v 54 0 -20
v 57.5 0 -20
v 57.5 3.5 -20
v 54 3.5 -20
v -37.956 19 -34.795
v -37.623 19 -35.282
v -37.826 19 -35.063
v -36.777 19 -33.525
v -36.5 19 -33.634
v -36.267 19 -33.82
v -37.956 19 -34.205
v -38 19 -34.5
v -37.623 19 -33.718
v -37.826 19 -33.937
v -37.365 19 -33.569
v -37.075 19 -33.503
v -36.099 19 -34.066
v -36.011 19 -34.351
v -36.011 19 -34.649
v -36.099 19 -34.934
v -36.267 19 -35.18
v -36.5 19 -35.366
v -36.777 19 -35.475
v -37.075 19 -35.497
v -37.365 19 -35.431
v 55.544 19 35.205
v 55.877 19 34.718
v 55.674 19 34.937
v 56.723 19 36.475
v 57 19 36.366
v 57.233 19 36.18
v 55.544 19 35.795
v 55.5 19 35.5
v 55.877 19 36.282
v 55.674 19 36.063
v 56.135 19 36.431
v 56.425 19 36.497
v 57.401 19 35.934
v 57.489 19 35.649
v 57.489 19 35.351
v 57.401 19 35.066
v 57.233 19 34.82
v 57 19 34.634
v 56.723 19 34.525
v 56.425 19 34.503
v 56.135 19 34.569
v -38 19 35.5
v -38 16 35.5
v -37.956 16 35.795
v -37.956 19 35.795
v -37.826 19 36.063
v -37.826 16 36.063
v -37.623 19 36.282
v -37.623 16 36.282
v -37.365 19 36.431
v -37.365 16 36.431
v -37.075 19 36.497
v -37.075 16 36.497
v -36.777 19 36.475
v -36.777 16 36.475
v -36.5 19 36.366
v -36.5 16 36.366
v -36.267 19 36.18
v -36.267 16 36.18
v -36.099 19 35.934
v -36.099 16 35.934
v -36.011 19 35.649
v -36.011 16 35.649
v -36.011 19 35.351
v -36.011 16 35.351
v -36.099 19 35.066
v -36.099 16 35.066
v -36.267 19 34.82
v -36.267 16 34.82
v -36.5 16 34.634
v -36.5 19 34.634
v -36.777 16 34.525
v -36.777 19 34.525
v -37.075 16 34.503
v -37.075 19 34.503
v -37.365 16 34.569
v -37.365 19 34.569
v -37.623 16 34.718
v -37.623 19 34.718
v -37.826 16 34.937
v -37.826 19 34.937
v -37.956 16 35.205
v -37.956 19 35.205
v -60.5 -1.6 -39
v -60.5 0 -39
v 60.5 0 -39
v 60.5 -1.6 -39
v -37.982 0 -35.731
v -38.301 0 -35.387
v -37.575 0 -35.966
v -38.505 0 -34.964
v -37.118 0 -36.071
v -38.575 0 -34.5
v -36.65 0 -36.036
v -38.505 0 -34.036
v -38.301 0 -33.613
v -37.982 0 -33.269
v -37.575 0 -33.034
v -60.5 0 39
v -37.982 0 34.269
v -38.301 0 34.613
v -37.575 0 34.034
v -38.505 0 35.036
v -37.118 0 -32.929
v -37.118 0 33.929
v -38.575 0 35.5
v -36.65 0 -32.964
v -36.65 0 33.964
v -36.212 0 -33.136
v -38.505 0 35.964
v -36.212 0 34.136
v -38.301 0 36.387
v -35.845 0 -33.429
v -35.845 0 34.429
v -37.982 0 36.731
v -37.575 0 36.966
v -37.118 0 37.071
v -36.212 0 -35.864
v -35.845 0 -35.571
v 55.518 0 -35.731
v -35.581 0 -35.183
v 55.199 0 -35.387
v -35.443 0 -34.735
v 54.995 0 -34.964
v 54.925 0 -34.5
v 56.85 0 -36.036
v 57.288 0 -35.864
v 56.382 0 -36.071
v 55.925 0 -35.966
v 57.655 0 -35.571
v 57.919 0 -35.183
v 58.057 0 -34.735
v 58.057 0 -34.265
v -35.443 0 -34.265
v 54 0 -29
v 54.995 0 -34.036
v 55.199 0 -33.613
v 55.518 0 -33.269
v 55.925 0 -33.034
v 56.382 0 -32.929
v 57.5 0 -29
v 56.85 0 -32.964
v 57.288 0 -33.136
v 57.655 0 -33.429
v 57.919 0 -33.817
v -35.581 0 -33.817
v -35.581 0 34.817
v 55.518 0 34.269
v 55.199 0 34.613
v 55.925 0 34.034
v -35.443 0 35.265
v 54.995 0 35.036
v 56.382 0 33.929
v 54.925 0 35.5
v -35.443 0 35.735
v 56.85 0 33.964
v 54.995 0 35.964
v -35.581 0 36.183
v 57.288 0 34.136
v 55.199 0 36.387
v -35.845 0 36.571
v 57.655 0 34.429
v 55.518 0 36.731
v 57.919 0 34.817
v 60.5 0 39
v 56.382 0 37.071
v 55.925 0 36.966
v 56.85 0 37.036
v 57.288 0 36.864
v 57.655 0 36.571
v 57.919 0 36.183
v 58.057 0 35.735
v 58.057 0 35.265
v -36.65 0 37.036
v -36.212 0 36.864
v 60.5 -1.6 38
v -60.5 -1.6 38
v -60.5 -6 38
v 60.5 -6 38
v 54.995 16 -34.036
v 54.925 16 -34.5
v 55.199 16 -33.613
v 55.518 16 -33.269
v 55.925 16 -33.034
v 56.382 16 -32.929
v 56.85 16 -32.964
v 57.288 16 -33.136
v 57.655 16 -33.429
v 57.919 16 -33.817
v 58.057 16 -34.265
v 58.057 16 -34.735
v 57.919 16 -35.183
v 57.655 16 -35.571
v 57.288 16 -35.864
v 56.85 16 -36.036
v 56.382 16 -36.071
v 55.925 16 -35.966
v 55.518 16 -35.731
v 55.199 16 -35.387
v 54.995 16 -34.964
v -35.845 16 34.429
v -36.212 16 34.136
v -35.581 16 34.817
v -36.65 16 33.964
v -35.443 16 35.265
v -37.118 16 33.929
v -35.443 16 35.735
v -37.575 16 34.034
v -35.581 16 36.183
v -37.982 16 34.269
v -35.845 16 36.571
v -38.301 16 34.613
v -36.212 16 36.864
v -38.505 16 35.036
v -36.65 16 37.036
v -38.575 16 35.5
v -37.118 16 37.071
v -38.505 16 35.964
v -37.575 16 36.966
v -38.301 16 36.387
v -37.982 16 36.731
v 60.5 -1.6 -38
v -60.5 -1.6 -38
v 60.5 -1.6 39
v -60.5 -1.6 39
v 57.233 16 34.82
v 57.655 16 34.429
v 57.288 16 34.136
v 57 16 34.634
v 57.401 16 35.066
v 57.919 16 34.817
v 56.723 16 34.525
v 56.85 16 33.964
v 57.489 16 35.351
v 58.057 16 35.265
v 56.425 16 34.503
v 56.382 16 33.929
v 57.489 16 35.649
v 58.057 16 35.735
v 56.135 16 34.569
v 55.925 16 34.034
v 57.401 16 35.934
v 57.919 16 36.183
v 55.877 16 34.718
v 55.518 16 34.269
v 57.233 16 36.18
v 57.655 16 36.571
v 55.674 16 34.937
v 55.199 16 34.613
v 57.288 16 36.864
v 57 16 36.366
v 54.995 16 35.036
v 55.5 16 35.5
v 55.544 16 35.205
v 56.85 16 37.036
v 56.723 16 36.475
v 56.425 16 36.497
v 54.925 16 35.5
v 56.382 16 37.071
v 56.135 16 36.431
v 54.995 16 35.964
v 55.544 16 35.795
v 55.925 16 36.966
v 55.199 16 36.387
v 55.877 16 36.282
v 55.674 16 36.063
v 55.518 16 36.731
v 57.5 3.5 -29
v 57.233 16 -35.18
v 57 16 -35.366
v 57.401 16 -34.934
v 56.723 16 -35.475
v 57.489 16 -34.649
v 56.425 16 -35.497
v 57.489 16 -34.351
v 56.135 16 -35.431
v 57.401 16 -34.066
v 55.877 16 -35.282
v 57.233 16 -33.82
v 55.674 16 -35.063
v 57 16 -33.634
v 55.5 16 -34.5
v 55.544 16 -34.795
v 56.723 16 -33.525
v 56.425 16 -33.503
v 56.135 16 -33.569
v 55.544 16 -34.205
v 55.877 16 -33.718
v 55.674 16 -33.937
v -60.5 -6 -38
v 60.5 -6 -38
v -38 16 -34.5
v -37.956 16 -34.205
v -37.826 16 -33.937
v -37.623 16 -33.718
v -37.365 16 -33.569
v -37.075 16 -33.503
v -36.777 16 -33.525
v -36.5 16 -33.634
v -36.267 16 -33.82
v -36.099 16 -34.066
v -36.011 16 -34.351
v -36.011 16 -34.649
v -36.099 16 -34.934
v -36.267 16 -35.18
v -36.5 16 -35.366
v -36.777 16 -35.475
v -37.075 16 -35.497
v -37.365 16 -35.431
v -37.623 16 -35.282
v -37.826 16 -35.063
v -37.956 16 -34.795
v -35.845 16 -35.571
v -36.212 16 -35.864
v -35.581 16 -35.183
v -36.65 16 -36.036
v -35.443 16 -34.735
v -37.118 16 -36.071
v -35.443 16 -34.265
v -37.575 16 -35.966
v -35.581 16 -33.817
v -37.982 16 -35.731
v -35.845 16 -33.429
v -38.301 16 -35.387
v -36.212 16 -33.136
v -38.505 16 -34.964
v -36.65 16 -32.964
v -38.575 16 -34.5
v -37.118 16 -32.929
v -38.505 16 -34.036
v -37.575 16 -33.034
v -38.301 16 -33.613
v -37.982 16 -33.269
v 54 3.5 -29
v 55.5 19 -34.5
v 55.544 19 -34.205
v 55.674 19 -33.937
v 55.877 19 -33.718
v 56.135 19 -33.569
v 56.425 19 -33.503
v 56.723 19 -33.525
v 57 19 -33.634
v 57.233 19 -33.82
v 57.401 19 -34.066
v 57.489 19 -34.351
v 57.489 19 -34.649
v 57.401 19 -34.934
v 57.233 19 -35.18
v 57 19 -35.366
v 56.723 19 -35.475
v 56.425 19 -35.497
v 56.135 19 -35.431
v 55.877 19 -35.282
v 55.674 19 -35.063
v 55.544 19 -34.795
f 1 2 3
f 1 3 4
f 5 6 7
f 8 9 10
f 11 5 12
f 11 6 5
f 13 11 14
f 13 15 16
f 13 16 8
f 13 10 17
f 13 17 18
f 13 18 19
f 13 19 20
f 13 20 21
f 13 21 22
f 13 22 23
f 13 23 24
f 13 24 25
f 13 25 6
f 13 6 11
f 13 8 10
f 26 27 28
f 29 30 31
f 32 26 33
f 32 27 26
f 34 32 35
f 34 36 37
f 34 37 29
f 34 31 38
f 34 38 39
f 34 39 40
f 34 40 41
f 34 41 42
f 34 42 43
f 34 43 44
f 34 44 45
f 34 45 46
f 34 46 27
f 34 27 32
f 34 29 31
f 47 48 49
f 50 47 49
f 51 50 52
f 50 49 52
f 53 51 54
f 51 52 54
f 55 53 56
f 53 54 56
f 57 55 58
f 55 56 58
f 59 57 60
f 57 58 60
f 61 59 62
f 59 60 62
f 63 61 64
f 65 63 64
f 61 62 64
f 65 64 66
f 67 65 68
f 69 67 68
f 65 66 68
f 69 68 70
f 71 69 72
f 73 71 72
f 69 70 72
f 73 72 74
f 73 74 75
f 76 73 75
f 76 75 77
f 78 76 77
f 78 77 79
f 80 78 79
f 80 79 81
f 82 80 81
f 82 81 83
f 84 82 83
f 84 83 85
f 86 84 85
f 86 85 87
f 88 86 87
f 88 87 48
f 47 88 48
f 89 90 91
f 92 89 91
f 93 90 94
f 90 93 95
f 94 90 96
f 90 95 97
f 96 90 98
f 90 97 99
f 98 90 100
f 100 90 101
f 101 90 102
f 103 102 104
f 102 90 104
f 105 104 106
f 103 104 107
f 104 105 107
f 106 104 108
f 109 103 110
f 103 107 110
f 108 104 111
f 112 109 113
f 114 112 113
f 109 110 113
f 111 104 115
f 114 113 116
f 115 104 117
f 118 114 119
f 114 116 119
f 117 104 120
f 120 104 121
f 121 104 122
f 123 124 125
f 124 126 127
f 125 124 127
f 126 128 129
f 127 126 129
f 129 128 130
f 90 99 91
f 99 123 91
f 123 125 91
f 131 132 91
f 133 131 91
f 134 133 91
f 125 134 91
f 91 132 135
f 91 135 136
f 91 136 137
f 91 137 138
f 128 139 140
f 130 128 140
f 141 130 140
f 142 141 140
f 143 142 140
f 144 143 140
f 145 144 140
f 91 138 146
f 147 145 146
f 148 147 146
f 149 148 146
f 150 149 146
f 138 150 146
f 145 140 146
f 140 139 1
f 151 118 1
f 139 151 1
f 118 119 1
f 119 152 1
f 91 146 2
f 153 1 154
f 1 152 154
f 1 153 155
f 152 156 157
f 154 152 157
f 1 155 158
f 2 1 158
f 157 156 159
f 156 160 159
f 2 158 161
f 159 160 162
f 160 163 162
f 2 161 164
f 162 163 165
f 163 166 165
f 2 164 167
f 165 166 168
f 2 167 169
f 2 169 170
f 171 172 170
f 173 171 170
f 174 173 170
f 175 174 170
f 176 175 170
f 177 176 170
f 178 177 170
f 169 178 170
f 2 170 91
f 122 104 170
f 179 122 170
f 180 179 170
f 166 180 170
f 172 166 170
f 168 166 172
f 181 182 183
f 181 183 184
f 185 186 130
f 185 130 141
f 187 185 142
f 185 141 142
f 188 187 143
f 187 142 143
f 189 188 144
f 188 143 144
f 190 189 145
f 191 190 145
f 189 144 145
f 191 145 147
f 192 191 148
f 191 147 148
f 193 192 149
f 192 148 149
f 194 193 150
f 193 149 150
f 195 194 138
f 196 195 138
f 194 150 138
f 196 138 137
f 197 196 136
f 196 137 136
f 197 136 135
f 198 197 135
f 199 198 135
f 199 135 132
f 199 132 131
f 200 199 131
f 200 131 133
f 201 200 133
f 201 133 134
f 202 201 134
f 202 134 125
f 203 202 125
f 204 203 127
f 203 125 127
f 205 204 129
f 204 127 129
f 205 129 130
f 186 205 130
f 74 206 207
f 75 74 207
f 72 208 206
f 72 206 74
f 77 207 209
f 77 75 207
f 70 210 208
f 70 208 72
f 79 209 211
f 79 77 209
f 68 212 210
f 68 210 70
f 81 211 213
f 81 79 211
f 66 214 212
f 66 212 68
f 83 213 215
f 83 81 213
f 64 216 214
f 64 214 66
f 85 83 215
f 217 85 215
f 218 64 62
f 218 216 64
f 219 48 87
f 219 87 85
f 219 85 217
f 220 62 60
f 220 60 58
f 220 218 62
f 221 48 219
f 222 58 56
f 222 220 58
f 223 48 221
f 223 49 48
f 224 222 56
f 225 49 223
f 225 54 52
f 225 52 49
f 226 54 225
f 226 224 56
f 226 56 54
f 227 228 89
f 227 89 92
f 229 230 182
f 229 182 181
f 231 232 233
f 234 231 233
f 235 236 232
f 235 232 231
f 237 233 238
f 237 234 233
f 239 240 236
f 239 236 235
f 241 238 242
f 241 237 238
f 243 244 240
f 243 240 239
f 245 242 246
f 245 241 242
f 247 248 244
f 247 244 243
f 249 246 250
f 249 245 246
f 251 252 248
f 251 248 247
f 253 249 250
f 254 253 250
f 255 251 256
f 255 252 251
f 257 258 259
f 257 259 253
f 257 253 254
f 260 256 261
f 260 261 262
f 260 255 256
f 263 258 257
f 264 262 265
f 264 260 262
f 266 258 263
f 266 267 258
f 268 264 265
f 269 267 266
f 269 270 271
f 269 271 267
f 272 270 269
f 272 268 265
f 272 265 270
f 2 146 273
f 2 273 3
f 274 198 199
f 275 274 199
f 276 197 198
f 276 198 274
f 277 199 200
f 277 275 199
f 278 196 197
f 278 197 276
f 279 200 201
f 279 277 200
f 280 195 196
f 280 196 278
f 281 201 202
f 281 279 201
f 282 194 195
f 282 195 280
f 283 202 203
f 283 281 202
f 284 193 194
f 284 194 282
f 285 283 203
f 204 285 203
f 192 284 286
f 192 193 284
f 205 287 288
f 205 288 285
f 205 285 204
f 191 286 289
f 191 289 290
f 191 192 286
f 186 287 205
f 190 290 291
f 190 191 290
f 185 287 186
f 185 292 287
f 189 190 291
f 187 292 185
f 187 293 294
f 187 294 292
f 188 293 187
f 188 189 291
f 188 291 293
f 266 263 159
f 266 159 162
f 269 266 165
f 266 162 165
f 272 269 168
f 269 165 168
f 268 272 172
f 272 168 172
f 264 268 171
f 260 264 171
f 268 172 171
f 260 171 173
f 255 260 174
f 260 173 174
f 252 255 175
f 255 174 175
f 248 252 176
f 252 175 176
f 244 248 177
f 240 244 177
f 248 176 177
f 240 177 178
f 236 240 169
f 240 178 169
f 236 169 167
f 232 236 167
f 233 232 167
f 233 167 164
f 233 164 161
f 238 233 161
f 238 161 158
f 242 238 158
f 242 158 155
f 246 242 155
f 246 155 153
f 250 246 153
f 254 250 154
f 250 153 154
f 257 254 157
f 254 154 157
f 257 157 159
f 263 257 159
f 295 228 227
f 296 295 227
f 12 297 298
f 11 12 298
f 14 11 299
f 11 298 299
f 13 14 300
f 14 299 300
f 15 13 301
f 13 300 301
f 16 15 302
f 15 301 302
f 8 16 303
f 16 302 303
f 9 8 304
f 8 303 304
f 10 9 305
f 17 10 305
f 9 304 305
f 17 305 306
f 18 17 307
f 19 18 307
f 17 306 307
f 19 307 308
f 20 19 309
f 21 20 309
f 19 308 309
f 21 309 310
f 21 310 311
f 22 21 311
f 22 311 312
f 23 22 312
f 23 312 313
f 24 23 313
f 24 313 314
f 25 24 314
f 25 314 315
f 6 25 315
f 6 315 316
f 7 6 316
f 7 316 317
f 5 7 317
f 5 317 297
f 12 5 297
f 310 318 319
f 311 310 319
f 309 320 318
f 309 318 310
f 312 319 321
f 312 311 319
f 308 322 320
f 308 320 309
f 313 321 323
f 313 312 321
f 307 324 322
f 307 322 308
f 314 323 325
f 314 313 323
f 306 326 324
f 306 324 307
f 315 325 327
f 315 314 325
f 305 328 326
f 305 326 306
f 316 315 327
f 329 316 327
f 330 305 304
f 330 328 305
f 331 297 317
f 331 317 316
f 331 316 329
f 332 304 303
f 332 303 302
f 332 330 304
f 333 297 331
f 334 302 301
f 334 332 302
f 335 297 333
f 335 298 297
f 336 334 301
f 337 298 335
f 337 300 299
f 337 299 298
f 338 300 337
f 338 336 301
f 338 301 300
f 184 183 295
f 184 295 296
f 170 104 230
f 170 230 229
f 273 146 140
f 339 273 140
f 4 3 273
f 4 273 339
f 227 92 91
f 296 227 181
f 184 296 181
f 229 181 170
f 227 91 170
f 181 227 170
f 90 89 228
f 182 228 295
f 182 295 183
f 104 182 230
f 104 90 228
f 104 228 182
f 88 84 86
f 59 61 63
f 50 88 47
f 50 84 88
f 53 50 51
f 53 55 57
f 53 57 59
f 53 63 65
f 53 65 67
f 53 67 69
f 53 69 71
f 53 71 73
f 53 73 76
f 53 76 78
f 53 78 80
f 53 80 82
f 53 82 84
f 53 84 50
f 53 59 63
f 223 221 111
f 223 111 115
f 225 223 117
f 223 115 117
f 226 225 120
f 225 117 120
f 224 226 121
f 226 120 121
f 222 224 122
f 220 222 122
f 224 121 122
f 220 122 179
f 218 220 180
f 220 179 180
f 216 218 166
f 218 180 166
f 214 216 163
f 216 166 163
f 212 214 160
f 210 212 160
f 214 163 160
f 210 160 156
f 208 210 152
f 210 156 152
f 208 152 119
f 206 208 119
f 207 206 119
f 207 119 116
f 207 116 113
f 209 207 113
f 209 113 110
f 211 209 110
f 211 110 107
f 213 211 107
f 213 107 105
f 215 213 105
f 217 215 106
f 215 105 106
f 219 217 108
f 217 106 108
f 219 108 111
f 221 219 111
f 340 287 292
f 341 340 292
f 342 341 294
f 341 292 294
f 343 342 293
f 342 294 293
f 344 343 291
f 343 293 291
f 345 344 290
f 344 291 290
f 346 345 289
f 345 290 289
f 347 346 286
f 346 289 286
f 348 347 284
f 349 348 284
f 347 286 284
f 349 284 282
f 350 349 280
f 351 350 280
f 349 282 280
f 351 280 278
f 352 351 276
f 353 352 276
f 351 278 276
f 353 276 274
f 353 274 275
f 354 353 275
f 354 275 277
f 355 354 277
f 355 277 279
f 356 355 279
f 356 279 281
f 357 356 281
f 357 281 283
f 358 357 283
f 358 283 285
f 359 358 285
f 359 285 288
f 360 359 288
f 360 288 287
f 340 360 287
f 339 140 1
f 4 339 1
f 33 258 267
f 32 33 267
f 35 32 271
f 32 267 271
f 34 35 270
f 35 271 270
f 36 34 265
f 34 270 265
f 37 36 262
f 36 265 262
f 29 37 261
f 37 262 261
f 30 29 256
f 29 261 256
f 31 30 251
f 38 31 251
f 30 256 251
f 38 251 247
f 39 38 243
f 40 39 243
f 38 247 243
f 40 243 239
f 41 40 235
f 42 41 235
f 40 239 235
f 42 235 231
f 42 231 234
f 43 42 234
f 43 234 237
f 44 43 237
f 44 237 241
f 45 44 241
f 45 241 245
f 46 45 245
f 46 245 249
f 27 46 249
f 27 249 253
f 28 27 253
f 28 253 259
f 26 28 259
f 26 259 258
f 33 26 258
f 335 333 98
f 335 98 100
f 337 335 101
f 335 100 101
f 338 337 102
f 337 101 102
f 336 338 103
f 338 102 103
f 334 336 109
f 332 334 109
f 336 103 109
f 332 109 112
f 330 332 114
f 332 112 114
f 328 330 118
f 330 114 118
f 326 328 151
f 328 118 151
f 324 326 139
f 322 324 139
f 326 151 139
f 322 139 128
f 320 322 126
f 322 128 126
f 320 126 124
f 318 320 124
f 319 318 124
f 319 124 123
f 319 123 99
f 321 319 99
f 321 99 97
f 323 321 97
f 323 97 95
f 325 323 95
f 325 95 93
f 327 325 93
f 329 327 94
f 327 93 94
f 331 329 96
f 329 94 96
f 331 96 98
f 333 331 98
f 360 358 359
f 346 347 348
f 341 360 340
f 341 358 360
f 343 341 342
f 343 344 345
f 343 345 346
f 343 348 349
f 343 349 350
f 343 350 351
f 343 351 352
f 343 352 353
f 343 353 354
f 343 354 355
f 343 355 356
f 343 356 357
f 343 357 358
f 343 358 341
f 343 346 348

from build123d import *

# Parameters (mm, degrees)
F0_W      = 121
F0_H      = 76
F1_DEPTH  = 6
F2_W      = 121
F2_H      = 78
F3_DEPTH  = 1.6
F4_R      = 1
F5_DEPTH  = 2
F6_W      = 3.5
F6_H      = 9
F7_DEPTH  = 3.5
F8_R      = 1.575
F9_DEPTH  = 16
F10_R     = 1
F11_DEPTH = 19


with BuildPart() as f1:
    # F0 (on Front) → F1 (new body)
    with BuildSketch(Plane.XZ):
        Rectangle(F0_W, F0_H)
    extrude(amount=F1_DEPTH)

    # F2 (on Front) → F3 (join)
    with BuildSketch(Plane.XZ):
        Rectangle(F2_W, F2_H)
    extrude(amount=F3_DEPTH)

    # F4 (on face) → F5 (join)
    with BuildSketch(Plane(origin=(0, 0, 0), x_dir=(-1, 0, 0), z_dir=(0, 1, 0))):
        with Locations((-56.5, 35.5)):
            Circle(F4_R)
        with Locations((-56.5, -34.5)):
            Circle(F4_R)
        with Locations((37, -34.5)):
            Circle(F4_R)
        with Locations((37, 35.5)):
            Circle(F4_R)
    extrude(amount=F5_DEPTH)

    # F6 (on face) → F7 (join)
    with BuildSketch(Plane(origin=(0, 0, 0), x_dir=(-1, 0, 0), z_dir=(0, 1, 0))):
        with Locations((-55.75, -24.5)):
            Rectangle(F6_W, F6_H)
    extrude(amount=F7_DEPTH)

    # F8 (on face) → F9 (join)
    with BuildSketch(Plane(origin=(0, 0, 0), x_dir=(-1, 0, 0), z_dir=(0, 1, 0))):
        with Locations((-56.5, 35.5)):
            Circle(F8_R)
        with Locations((37, 35.5)):
            Circle(F8_R)
        with Locations((-56.5, -34.5)):
            Circle(F8_R)
        with Locations((37, -34.5)):
            Circle(F8_R)
    extrude(amount=F9_DEPTH)

    # F10 (on face) → F11 (join)
    with BuildSketch(Plane(origin=(0, 0, 0), x_dir=(-1, 0, 0), z_dir=(0, 1, 0))):
        with Locations((37, 35.5)):
            Circle(F10_R)
        with Locations((37, -34.5)):
            Circle(F10_R)
        with Locations((-56.5, -34.5)):
            Circle(F10_R)
        with Locations((-56.5, 35.5)):
            Circle(F10_R)
    extrude(amount=F11_DEPTH)


solid = f1.part
